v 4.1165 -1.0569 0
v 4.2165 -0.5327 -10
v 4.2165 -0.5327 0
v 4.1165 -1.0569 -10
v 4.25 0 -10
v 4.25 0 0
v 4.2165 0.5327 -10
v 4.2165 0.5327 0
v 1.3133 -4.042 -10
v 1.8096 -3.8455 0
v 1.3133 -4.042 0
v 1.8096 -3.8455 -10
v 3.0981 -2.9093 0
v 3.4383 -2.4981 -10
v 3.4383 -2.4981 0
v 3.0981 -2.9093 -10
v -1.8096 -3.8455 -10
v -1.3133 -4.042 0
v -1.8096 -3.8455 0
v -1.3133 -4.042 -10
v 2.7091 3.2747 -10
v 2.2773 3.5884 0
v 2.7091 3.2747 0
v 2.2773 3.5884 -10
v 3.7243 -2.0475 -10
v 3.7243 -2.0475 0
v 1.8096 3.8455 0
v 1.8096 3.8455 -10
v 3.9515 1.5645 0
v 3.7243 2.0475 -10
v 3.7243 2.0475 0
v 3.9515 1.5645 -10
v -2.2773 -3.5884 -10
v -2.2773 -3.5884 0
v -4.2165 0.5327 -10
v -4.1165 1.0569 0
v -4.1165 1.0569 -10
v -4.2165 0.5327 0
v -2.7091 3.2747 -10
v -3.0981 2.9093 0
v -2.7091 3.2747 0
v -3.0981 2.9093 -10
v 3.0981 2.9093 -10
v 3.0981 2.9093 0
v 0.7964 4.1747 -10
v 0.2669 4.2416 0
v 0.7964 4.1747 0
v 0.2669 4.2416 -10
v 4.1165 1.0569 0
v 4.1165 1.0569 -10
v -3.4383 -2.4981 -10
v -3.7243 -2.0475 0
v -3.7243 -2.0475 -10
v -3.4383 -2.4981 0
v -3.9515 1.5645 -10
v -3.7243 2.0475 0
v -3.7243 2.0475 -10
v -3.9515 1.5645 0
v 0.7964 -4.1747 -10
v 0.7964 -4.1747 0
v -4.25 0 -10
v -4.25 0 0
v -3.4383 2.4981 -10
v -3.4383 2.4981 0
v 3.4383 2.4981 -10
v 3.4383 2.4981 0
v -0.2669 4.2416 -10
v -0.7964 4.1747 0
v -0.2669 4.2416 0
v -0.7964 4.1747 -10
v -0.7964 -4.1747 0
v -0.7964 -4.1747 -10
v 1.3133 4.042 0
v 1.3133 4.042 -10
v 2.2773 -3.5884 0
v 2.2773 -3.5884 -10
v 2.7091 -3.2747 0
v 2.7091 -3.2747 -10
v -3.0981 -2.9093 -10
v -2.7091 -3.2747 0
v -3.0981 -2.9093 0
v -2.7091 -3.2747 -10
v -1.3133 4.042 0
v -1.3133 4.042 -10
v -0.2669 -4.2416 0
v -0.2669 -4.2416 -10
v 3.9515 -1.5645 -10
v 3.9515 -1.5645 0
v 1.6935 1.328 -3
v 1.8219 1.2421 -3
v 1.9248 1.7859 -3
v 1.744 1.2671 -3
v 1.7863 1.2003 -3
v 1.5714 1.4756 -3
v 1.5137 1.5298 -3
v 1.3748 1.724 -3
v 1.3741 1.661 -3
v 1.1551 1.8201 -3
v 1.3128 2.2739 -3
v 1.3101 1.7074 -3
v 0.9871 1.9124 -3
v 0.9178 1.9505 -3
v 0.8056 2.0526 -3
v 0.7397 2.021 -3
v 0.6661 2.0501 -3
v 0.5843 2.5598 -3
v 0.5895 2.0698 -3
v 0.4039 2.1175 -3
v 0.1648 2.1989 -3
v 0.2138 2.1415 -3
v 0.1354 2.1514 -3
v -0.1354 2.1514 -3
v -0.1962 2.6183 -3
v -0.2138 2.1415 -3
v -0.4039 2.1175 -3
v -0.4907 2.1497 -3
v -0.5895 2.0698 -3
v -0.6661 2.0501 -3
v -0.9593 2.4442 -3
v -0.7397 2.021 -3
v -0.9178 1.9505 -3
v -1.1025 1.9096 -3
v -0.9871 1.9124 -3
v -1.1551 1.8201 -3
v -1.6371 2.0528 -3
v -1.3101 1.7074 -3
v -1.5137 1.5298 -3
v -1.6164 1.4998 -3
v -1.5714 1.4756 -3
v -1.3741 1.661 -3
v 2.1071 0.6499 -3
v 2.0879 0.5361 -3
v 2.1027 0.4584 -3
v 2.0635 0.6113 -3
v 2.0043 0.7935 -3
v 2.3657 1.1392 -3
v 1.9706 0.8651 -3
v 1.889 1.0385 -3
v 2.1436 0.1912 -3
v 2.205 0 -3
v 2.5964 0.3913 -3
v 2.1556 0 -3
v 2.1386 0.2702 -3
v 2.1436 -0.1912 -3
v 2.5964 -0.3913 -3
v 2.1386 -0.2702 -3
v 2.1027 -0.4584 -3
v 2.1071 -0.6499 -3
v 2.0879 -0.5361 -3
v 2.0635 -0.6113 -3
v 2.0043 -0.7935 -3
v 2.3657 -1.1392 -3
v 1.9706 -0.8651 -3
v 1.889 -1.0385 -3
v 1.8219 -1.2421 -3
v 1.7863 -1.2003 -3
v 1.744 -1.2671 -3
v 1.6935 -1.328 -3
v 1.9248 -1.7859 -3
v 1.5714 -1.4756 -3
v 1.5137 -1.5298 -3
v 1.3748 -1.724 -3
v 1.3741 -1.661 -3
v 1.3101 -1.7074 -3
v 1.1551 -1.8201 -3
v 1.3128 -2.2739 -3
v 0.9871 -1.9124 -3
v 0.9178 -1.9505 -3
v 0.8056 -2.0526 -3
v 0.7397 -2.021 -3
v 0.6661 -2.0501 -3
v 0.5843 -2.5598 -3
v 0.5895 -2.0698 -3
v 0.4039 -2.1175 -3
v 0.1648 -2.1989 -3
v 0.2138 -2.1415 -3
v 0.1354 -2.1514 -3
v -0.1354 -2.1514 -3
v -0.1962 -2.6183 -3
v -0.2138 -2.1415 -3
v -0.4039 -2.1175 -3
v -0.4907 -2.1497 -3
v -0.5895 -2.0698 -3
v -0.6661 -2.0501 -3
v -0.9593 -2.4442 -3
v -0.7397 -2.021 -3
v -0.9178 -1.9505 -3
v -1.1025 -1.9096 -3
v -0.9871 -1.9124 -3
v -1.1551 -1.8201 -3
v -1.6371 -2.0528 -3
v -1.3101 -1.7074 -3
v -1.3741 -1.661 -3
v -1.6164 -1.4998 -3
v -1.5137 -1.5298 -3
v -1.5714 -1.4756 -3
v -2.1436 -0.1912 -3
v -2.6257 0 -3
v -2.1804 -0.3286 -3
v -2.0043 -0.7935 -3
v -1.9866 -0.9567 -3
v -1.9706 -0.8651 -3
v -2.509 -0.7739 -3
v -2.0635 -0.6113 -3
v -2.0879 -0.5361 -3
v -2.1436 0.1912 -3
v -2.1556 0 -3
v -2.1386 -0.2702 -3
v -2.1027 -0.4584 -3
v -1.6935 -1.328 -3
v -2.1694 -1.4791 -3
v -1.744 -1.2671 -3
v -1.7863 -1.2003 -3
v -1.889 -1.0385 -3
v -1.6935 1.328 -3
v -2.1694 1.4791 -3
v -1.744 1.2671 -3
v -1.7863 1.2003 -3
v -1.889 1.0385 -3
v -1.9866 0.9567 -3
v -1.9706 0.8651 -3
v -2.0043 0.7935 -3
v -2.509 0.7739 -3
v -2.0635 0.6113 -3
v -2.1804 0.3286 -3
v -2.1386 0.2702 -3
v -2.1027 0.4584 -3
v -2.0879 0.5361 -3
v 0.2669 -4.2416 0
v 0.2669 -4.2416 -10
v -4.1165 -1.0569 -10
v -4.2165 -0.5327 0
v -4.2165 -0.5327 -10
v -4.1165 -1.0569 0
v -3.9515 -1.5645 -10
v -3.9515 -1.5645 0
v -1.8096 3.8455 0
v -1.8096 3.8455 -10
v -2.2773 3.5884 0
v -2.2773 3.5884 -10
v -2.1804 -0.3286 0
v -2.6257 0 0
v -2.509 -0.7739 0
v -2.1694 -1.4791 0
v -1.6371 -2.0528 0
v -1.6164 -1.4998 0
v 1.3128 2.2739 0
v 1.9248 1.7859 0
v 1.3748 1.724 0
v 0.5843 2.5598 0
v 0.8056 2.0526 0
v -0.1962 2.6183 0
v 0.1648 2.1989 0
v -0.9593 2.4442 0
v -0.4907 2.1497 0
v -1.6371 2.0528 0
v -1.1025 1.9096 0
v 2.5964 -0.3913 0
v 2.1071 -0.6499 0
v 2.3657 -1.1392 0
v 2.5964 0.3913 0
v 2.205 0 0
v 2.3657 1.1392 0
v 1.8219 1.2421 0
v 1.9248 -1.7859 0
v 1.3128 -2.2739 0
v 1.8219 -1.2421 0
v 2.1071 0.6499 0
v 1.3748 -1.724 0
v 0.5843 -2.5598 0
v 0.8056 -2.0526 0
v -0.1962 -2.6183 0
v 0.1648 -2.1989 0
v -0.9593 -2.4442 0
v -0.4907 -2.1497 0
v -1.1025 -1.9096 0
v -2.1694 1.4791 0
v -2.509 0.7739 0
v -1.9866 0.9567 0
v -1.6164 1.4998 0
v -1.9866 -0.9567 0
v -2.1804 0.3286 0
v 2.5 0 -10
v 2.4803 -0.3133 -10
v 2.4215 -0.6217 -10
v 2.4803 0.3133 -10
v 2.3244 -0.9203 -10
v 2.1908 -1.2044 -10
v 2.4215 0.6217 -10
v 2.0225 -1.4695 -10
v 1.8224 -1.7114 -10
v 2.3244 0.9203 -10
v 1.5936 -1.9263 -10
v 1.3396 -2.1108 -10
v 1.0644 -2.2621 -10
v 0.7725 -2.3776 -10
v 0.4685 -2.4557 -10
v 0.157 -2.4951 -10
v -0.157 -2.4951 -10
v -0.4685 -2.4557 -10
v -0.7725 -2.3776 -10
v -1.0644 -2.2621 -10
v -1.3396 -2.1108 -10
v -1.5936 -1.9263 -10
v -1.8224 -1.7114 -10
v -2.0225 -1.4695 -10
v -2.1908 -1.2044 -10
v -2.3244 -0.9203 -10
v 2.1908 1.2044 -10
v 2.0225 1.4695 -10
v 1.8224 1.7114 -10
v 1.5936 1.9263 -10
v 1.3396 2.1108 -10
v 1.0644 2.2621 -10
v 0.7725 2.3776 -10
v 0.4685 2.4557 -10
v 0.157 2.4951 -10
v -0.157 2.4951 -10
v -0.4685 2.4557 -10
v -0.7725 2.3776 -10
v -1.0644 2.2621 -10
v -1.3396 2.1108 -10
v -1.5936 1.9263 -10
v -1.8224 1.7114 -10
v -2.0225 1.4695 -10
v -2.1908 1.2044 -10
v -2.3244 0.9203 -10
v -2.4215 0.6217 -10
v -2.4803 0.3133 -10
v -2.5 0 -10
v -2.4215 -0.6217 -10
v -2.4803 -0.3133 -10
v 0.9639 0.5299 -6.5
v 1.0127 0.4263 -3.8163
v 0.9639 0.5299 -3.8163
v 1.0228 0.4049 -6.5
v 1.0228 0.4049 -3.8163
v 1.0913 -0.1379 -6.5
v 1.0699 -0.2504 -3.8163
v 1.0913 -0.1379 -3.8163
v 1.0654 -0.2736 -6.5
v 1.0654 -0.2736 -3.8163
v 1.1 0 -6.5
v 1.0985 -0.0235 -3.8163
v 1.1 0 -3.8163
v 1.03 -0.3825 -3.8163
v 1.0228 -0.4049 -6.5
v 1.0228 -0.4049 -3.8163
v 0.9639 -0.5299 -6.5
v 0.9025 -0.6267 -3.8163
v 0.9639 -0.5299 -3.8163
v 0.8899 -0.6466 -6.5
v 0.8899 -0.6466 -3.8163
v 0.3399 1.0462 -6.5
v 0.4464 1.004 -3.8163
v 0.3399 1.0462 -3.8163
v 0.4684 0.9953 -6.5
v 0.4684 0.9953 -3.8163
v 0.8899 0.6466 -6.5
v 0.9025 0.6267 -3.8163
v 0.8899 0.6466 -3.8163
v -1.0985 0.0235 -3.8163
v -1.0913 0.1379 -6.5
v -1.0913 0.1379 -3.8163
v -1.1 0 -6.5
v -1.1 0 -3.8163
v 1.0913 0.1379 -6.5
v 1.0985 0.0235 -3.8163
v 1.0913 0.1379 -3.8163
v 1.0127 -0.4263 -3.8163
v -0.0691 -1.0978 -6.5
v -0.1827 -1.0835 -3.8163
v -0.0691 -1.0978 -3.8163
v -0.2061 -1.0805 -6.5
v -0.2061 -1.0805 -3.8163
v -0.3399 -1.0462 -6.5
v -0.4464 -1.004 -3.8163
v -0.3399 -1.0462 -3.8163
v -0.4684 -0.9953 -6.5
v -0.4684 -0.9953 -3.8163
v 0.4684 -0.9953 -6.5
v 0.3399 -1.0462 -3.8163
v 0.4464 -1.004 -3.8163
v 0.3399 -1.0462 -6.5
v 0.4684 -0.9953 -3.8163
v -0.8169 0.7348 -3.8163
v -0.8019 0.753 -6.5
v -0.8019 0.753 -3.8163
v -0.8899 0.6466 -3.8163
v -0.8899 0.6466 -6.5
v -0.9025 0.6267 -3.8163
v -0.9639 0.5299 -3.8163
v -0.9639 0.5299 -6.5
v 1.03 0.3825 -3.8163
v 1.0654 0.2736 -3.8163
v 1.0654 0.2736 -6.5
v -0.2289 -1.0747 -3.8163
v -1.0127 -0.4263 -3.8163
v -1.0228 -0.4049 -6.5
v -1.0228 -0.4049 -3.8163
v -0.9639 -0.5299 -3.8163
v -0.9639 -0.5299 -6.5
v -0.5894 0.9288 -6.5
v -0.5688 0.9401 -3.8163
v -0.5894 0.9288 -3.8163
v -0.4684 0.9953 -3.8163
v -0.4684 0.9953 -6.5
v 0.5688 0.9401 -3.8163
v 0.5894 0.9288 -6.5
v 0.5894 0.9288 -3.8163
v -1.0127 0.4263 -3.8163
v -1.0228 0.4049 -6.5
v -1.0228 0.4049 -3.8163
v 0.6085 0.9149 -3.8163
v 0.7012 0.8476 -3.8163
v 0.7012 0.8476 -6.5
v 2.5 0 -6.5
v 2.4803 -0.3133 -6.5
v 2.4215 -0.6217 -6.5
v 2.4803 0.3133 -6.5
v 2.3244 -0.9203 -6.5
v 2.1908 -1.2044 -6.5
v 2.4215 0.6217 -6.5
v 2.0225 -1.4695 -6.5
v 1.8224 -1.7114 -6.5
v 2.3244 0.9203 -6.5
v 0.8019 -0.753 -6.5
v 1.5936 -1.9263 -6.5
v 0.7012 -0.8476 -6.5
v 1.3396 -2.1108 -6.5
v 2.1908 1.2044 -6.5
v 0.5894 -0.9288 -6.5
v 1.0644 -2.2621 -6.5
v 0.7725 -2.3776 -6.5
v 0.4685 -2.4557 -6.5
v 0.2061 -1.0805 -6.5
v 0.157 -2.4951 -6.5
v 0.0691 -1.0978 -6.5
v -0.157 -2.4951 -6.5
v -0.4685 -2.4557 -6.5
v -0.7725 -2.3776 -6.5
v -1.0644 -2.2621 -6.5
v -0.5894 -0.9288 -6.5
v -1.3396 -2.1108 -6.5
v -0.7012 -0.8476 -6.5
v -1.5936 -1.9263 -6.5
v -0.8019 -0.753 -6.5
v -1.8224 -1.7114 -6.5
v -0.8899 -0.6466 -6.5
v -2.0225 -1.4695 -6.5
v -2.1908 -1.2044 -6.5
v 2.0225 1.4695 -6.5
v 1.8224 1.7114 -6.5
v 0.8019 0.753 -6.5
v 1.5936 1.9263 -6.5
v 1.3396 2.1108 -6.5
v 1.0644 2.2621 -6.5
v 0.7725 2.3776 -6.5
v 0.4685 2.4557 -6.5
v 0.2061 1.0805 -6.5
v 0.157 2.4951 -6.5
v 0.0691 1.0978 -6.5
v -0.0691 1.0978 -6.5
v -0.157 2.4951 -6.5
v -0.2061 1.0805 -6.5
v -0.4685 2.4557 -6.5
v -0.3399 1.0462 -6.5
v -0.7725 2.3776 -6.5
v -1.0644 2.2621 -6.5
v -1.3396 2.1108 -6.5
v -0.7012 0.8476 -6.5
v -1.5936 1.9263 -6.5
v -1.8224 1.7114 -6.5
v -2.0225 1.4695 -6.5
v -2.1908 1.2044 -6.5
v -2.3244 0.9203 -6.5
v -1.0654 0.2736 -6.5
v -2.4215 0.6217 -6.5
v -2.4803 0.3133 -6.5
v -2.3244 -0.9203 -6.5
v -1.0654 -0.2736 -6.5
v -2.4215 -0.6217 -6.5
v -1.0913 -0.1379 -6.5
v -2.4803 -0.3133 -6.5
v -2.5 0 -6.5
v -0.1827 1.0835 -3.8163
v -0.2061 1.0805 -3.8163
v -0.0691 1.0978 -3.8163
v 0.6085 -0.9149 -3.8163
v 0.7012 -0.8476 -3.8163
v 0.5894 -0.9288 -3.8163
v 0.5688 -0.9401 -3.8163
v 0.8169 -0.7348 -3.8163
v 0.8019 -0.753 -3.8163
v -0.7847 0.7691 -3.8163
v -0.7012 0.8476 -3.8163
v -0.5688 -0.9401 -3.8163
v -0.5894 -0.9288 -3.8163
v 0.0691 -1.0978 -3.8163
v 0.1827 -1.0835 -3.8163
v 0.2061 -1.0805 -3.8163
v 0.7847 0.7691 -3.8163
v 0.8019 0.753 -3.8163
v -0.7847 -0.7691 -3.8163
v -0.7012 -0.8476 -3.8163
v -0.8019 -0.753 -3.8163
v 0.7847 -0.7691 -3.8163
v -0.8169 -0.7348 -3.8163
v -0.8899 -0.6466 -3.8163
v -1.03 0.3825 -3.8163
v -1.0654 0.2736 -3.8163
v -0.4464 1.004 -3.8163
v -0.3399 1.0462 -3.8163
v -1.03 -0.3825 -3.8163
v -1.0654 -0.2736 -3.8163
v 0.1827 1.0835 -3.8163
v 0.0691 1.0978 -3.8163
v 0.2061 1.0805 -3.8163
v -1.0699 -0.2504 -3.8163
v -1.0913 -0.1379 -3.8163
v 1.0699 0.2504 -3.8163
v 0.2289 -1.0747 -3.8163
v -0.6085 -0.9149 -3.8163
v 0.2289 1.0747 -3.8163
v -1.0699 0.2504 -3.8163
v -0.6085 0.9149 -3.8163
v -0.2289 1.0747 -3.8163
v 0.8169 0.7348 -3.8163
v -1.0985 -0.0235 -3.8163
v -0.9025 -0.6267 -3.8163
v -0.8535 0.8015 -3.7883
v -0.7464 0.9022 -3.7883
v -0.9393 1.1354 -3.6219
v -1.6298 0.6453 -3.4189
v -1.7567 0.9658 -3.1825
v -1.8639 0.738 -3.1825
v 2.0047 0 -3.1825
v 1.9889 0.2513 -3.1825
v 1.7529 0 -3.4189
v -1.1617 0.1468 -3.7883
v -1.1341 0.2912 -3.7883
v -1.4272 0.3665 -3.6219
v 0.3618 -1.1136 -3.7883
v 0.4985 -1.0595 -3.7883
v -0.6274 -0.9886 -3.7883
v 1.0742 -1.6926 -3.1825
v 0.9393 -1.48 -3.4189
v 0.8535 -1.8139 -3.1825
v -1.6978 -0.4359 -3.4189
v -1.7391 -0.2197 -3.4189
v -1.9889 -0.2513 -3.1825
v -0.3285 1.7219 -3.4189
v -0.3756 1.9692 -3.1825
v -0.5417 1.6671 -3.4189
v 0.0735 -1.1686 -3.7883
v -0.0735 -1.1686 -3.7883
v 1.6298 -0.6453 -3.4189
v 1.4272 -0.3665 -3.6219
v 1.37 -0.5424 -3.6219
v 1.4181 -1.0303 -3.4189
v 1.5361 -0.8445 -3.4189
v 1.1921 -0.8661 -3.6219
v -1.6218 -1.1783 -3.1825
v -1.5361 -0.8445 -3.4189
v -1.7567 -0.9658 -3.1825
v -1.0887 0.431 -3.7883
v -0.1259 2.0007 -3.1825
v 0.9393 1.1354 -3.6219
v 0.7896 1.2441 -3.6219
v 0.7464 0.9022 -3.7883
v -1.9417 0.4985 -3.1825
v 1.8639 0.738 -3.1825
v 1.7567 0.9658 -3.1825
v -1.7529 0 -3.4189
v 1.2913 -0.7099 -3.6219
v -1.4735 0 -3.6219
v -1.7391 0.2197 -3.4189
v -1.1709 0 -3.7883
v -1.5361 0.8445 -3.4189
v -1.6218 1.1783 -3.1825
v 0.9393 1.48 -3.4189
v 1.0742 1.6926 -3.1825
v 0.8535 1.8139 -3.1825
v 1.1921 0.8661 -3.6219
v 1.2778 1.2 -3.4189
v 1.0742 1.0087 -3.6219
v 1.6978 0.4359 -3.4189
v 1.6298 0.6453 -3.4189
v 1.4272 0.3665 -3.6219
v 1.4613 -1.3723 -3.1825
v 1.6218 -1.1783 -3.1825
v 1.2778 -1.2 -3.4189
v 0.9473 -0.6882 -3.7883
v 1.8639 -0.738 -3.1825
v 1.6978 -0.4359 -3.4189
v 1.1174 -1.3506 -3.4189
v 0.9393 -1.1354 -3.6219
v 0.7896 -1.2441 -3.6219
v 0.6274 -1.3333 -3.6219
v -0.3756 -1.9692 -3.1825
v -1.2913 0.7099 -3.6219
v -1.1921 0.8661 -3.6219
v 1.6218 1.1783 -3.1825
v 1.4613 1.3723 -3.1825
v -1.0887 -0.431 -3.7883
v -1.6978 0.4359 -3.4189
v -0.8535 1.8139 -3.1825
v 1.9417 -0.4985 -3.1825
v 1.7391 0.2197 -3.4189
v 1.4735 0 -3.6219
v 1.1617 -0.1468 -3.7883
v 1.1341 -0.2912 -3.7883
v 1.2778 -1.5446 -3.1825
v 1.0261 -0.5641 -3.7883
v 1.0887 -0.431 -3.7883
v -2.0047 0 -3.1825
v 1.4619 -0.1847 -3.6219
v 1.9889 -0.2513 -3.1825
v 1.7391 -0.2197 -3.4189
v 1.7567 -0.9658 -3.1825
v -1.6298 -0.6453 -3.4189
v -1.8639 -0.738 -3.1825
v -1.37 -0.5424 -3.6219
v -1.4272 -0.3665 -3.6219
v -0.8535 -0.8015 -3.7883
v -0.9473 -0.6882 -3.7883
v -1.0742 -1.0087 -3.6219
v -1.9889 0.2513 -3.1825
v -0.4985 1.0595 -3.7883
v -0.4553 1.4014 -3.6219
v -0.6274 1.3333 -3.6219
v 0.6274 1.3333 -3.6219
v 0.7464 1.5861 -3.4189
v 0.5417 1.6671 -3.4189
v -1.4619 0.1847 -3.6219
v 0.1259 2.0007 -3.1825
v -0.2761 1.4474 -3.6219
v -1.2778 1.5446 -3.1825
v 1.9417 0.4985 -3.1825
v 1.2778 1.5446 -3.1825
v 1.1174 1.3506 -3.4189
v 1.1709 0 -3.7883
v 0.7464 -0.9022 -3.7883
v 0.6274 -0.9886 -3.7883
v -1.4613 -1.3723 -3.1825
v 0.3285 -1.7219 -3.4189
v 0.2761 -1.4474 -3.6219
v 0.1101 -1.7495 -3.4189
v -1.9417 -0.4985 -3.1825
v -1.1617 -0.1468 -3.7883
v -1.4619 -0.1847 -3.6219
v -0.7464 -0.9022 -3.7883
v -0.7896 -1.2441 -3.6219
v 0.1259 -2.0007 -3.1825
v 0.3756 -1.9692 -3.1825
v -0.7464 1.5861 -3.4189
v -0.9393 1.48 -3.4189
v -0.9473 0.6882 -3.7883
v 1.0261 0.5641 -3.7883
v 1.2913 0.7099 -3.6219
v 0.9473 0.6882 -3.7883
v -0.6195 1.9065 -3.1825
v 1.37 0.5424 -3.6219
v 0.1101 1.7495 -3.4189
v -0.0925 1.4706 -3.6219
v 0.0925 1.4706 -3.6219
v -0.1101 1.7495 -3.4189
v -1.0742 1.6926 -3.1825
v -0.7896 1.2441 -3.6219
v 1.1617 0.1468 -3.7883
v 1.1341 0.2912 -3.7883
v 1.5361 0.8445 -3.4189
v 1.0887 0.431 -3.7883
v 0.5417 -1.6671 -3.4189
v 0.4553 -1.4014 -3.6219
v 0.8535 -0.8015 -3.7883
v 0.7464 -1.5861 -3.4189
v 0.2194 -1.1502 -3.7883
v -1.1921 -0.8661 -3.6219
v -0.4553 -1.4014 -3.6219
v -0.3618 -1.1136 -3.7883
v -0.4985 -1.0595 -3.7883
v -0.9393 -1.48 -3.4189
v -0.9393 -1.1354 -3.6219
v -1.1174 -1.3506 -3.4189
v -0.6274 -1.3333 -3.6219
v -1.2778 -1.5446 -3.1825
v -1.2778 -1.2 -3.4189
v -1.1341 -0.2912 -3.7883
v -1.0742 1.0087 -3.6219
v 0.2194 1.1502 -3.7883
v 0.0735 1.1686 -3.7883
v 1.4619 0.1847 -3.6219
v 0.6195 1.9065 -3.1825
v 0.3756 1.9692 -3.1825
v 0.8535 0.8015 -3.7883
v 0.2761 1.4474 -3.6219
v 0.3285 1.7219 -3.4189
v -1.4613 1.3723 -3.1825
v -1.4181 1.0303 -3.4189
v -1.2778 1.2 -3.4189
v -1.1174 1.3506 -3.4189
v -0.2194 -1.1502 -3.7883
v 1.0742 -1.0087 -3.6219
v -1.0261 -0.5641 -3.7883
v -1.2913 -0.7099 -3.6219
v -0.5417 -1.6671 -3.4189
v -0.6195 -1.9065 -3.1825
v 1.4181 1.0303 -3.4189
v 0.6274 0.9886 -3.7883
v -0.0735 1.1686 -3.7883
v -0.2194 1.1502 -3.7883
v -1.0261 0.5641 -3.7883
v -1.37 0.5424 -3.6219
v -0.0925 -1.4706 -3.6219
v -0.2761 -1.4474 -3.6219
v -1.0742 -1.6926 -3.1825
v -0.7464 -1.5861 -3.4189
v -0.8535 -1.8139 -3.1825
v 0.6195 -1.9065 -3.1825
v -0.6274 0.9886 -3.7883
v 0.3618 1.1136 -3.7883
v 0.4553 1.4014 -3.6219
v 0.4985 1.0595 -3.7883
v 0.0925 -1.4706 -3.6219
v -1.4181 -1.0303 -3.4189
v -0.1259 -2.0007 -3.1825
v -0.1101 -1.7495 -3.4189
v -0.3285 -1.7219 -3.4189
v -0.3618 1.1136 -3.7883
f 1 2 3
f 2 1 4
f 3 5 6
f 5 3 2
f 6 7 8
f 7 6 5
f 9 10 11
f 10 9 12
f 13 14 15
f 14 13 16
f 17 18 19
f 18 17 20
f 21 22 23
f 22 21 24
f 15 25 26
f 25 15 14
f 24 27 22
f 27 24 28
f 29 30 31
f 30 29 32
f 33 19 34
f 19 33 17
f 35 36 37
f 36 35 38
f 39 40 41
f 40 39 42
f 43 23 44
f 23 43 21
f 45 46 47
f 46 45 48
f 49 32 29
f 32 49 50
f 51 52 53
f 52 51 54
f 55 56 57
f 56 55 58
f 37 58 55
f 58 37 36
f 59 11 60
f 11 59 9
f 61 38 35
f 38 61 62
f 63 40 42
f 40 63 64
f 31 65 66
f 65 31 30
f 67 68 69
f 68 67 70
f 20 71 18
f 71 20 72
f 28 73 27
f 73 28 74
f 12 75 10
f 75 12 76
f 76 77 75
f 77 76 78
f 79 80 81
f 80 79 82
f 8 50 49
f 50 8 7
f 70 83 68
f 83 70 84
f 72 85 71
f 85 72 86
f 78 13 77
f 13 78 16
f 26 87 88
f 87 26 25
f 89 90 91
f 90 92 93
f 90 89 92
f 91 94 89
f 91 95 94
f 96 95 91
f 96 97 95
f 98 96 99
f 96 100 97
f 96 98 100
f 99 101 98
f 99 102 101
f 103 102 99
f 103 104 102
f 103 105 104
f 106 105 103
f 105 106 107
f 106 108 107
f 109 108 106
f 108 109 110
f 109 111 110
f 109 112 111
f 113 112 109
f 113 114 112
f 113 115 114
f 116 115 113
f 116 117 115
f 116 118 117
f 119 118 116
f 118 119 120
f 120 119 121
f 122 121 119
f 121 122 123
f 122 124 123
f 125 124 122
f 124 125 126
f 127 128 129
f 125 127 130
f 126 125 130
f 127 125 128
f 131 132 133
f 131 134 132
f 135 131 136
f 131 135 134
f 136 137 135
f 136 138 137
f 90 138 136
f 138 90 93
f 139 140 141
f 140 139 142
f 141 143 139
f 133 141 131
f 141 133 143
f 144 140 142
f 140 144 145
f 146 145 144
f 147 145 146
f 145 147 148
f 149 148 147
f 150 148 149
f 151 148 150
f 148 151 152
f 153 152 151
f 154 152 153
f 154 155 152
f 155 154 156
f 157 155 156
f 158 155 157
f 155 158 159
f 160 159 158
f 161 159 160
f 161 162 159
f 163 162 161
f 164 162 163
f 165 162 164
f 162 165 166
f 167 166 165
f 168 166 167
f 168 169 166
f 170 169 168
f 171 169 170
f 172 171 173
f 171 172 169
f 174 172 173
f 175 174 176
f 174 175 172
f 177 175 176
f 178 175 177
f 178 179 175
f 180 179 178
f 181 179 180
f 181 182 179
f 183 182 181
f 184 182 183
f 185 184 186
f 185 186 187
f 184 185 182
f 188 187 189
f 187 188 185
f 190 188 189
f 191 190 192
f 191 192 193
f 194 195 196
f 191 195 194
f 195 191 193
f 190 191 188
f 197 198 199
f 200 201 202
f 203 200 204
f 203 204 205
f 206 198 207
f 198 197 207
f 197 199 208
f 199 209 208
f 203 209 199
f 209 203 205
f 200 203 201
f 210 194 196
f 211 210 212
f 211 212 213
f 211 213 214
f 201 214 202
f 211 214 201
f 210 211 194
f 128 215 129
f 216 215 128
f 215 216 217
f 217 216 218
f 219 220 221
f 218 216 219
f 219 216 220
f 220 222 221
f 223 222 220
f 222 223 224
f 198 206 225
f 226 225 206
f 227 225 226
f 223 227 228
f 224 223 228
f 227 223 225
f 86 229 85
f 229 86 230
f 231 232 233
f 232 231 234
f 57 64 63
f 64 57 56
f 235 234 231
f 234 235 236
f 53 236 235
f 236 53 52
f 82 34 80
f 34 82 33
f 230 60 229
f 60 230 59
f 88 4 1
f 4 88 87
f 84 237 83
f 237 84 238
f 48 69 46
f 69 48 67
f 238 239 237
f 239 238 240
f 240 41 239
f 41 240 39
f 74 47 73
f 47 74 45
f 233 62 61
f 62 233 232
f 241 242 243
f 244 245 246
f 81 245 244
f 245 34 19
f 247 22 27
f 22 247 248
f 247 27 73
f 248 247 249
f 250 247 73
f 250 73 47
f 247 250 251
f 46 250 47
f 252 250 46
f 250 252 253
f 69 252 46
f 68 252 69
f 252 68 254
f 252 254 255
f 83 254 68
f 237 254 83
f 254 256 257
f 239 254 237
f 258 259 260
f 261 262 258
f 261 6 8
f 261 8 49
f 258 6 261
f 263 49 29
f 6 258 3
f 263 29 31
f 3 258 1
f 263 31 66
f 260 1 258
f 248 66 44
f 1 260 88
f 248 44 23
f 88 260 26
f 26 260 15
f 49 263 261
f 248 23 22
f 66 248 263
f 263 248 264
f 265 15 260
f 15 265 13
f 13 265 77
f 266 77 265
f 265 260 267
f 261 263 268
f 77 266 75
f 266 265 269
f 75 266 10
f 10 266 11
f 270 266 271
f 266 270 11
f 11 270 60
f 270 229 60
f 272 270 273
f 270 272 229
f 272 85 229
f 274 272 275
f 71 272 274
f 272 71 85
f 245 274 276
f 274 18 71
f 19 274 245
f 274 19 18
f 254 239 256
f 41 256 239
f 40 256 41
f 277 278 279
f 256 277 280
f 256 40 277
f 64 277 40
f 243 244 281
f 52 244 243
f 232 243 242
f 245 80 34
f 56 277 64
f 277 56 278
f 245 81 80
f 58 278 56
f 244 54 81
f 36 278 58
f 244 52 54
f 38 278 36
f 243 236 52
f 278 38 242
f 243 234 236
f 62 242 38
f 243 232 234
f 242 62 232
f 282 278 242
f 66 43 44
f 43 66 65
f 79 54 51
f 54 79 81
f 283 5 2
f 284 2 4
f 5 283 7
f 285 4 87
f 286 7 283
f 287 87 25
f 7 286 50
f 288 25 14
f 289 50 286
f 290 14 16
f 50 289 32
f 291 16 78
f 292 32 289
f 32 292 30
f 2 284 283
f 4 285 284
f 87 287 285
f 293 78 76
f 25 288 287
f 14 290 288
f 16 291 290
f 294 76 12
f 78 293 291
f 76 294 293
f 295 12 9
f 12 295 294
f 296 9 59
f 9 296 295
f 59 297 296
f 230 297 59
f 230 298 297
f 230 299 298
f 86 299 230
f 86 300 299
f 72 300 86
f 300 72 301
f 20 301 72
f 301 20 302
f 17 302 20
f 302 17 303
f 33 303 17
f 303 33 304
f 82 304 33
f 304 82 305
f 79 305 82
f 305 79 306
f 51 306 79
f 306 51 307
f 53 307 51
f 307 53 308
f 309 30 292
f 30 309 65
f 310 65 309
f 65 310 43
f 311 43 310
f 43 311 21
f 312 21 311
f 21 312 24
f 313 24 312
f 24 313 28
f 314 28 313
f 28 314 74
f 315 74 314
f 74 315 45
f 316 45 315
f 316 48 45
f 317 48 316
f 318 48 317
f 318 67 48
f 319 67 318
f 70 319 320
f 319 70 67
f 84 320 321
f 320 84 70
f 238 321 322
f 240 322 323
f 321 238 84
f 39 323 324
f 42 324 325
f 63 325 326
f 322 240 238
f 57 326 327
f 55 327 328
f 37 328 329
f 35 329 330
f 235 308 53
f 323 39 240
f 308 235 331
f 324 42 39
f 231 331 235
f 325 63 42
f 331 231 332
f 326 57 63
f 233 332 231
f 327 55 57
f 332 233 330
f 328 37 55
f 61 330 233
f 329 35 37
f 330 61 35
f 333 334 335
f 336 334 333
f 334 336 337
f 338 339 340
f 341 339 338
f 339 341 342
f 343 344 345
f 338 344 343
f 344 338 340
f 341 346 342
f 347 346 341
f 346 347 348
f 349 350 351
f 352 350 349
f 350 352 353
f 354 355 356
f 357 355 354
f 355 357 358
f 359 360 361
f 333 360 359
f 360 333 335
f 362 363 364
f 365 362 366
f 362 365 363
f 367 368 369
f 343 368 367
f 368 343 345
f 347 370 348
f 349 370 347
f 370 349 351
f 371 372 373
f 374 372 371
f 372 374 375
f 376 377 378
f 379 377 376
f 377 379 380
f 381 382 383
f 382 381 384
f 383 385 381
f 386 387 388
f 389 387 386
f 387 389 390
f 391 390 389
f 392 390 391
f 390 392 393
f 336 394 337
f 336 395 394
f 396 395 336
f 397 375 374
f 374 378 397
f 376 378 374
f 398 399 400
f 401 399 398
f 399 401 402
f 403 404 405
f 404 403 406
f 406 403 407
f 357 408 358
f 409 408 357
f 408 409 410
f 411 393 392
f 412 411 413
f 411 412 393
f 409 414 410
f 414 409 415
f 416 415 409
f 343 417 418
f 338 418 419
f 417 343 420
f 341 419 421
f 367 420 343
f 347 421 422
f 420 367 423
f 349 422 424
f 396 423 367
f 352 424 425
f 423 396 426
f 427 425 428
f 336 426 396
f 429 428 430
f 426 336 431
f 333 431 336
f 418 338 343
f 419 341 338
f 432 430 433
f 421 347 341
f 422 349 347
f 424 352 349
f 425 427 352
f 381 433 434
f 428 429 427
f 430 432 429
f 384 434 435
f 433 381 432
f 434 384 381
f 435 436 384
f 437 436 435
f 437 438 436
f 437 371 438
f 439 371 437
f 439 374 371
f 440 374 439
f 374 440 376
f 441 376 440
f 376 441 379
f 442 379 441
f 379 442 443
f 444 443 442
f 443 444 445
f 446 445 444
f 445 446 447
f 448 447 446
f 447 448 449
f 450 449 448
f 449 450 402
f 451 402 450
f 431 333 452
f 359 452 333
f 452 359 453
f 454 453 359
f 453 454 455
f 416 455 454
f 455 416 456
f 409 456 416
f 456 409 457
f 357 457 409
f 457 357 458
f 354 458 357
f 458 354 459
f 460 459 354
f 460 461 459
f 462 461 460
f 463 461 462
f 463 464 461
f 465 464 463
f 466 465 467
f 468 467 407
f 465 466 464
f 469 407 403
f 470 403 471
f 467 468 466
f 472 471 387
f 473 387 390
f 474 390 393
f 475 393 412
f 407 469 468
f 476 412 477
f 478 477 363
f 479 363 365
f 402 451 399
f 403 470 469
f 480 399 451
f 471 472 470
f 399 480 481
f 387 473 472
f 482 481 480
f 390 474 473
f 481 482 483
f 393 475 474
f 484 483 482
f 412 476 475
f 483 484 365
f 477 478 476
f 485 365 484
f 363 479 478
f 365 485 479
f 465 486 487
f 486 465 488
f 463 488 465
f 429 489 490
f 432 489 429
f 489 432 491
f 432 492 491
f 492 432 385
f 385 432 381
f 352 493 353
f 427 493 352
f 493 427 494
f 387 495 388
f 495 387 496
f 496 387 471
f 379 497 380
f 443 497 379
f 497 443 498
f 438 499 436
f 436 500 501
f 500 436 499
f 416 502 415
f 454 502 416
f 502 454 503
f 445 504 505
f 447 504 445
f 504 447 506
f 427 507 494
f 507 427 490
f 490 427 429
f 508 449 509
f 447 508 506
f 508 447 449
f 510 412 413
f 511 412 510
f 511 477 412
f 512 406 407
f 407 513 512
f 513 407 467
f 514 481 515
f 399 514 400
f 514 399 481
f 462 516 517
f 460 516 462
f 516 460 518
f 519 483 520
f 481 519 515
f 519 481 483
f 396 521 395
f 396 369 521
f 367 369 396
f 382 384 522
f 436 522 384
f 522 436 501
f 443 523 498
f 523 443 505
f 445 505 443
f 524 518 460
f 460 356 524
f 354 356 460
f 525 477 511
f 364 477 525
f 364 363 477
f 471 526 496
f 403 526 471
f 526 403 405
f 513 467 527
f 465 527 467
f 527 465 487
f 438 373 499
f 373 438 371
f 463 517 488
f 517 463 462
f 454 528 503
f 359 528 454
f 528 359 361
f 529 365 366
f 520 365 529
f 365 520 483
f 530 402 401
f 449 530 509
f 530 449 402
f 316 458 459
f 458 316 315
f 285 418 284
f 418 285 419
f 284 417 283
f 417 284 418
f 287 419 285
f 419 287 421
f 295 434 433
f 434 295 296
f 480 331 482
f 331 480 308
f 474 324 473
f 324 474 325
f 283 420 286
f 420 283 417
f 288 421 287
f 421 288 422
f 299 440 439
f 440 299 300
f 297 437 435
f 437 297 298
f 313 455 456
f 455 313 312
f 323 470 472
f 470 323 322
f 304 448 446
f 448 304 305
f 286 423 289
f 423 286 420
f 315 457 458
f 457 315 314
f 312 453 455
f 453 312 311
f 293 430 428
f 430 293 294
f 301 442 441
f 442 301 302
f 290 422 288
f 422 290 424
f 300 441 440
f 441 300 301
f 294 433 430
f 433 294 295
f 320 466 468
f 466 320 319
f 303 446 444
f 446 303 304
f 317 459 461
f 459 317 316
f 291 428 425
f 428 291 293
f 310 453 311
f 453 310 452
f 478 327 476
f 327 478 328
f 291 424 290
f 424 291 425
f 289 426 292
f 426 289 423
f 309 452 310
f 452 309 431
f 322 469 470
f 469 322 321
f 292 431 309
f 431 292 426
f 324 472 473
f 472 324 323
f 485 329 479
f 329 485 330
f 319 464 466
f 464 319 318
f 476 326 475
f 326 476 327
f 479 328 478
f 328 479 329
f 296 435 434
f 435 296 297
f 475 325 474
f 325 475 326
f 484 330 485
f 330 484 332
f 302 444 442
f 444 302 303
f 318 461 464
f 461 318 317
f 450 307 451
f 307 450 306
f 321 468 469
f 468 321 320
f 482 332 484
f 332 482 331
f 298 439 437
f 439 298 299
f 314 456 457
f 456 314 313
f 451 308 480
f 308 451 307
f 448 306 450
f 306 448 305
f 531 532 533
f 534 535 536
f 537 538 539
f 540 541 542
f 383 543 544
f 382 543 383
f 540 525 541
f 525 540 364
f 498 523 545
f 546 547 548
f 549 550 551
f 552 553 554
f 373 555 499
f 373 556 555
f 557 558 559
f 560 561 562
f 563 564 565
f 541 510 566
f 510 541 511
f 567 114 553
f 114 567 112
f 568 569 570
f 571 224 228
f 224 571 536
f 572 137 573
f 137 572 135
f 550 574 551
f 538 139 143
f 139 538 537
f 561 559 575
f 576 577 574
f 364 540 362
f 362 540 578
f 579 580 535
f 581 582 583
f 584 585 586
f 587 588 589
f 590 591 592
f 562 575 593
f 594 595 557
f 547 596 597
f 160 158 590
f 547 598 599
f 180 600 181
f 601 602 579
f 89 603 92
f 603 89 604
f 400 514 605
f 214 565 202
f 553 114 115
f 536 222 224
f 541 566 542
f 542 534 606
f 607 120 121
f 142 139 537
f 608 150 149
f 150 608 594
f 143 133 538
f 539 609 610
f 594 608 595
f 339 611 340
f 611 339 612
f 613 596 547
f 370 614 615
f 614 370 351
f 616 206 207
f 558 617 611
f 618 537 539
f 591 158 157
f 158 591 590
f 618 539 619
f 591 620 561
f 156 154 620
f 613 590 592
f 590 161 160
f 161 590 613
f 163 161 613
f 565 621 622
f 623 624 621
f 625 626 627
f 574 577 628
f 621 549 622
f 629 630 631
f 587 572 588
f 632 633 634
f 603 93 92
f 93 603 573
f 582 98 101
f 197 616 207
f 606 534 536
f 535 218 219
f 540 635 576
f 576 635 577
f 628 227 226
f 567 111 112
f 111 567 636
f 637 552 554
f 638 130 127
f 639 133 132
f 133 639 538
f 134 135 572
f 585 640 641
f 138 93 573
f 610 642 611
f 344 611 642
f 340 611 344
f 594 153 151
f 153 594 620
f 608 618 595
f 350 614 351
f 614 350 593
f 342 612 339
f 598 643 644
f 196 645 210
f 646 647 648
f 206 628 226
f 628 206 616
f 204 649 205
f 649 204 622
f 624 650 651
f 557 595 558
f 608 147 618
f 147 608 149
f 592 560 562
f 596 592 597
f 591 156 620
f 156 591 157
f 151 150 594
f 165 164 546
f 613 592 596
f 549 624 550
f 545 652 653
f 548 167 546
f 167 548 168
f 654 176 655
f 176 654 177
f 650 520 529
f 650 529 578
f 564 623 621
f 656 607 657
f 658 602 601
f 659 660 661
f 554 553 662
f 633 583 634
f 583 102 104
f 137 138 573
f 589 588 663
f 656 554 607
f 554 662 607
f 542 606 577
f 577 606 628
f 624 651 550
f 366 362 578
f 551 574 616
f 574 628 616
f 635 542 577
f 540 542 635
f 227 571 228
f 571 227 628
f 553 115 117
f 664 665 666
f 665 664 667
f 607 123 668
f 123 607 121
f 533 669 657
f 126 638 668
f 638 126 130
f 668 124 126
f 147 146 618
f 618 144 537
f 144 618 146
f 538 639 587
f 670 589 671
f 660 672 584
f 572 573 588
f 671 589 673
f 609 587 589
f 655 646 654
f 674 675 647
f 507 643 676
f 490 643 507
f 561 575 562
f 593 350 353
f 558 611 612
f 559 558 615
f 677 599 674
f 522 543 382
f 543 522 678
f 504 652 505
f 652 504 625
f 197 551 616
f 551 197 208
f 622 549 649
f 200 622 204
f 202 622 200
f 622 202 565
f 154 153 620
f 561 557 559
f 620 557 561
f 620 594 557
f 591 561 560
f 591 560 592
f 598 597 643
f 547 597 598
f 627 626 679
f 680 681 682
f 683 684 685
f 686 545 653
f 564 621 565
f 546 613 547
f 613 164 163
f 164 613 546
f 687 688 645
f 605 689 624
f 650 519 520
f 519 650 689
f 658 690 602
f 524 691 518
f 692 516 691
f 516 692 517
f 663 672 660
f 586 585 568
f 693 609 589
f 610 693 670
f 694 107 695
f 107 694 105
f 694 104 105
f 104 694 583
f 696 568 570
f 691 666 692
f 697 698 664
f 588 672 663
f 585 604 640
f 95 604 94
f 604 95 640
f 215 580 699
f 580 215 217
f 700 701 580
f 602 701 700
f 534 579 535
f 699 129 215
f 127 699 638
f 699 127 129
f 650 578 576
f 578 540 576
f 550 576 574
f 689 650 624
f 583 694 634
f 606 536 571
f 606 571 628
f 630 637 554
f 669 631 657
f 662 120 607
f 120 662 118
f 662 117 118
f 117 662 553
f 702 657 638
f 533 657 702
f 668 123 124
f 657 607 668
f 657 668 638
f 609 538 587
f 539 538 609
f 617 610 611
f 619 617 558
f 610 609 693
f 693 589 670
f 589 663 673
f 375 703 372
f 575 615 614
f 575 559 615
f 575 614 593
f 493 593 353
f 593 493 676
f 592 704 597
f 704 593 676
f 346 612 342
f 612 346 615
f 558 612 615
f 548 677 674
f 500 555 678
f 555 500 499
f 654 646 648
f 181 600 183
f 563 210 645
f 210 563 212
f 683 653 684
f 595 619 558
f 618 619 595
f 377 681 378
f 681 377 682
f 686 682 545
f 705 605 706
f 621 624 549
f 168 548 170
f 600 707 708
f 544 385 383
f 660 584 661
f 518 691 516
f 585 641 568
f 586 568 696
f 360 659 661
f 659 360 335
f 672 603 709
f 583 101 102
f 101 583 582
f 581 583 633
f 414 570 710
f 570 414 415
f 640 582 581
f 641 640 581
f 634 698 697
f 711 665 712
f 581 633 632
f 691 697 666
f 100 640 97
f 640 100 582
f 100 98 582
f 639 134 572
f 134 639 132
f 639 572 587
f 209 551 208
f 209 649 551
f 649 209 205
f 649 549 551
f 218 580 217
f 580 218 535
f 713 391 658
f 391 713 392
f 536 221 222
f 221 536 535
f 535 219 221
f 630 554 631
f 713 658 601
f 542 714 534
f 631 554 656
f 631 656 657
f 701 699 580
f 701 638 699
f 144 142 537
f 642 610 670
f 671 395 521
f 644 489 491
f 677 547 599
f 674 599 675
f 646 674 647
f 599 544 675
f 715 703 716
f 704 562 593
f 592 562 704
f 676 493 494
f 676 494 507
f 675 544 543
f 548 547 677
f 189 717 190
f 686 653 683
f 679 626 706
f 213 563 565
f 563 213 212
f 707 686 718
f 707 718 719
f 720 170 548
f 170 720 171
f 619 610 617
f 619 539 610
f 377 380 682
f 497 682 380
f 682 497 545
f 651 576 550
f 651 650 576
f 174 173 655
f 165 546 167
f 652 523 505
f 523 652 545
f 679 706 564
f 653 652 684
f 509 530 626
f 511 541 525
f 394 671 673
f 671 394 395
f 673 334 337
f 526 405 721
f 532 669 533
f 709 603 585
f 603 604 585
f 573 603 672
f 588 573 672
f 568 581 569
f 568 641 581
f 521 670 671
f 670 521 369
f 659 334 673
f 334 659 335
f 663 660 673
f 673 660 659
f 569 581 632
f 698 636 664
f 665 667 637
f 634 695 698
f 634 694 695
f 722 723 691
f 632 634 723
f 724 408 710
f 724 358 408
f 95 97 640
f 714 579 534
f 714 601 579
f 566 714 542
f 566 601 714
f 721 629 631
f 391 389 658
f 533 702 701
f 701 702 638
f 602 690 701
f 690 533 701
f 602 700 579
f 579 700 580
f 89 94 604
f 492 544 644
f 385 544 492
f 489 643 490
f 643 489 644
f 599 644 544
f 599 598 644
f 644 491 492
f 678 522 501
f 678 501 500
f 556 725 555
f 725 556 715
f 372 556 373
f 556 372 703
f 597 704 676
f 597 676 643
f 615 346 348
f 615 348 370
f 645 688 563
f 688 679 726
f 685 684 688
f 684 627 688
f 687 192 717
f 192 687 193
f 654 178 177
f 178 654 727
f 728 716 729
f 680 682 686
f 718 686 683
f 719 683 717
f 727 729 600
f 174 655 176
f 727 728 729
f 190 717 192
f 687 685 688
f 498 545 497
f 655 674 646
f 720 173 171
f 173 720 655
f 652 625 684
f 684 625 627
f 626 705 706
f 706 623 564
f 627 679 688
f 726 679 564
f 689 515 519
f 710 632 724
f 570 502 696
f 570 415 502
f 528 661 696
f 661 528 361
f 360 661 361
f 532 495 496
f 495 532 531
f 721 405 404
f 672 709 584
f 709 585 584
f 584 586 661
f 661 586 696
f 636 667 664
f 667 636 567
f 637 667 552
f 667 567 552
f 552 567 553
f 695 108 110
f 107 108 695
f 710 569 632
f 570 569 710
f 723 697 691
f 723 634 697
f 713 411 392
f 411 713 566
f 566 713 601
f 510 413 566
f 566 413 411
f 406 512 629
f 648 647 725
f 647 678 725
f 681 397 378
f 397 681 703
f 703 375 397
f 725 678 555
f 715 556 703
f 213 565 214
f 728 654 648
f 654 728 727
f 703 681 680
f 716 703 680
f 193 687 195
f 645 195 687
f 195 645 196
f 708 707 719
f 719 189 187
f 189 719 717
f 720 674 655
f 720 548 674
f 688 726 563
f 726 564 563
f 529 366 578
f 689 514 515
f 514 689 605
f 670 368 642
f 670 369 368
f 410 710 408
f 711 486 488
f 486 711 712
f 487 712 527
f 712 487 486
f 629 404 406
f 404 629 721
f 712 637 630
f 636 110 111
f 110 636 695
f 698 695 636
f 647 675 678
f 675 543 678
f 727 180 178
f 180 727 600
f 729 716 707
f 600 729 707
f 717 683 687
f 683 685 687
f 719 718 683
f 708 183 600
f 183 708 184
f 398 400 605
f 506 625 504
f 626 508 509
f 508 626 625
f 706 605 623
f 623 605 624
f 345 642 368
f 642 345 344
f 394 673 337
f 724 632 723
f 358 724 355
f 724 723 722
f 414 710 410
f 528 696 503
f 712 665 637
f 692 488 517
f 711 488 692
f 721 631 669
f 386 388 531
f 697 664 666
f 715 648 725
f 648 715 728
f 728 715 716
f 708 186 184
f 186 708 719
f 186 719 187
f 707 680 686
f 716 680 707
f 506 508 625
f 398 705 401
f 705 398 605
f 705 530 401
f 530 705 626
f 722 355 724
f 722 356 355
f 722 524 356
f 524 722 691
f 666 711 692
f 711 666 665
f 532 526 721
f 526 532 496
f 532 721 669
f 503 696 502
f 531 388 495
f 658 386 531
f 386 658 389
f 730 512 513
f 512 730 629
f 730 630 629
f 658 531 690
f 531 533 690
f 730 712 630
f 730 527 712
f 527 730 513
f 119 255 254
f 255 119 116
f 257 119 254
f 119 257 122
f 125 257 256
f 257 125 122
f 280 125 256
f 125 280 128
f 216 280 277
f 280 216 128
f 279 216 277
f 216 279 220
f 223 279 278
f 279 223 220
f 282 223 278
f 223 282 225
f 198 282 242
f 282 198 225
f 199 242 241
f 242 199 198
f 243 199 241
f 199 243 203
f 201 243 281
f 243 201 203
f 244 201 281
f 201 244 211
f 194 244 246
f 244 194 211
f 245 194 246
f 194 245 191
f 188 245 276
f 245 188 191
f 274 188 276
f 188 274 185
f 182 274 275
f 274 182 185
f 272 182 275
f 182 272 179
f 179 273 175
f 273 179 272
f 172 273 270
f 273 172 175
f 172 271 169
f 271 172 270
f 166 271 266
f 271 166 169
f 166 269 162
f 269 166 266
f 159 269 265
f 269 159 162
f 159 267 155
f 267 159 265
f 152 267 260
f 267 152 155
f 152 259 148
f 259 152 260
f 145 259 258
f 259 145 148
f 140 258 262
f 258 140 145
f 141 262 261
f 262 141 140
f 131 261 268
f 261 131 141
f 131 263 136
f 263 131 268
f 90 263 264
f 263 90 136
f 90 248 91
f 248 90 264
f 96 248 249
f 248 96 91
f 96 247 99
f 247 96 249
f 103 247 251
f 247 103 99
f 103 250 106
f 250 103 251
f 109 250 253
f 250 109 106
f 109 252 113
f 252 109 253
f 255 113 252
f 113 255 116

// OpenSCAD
/*
Copyright (c) 2017 Paul Austin - SDG

Permission is hereby granted, free of charge, to any person obtaining a copy
of this software and associated documentation files (the "Software"), to deal
in the Software without restriction, including without limitation the rights
to use, copy, modify, merge, publish, distribute, sublicense, and/or sell
copies of the Software, and to permit persons to whom the Software is
furnished to do so, subject to the following conditions:

The above copyright notice and this permission notice shall be included in all
copies or substantial portions of the Software.

THE SOFTWARE IS PROVIDED "AS IS", WITHOUT WARRANTY OF ANY KIND, EXPRESS OR
IMPLIED, INCLUDING BUT NOT LIMITED TO THE WARRANTIES OF MERCHANTABILITY,
FITNESS FOR A PARTICULAR PURPOSE AND NONINFRINGEMENT. IN NO EVENT SHALL THE
AUTHORS OR COPYRIGHT HOLDERS BE LIABLE FOR ANY CLAIM, DAMAGES OR OTHER
LIABILITY, WHETHER IN AN ACTION OF CONTRACT, TORT OR OTHERWISE, ARISING FROM,
OUT OF OR IN CONNECTION WITH THE SOFTWARE OR THE USE OR OTHER DEALINGS IN THE
SOFTWARE.
*/

$fn = 50;

module coreHub(splineCount = 20, coreH = 4.5, splineH = 3, splineD=5.0, d = 8.5) {
    
    // Approx spline shaft diameters
    // sg90(subMicro) - 5mm
    // micro          - 6mm
    screwFlangeThickness = 3.5;
    screwHeadDiameter = 5;
    screwShaftDiameter = 2.2;
    
    // The main shaft hub
    difference() {
        cylinder(d=d, h=splineH);
        cylinder(d=splineD+0.35, h=splineH);
    }

    // Splines on the inside of the hub
    #color("red") linear_extrude(splineH)
    for ( rib = [0:(360/splineCount):360]) {
        // Pivot aroung origin
        rotate([0,0,rib])
        // Move out from origin
        translate([splineD/2+0.2,0,0])
        // Make corner face origin
        rotate([0,0,45])
        // Make a square
        square([0.7,0.7], center = true);
    }
    

    // Hole for the screw
    color("green") difference() {    
        translate([0,0,splineH]) cylinder(d=d,h=(coreH - splineH));
        {
        #translate([0,0,splineH]) cylinder(d=screwShaftDiameter, h=screwFlangeThickness);
        #translate([0,0,splineH+screwFlangeThickness]) cylinder(d=screwHeadDiameter,h=10);
        #translate([0,0,1.3])sphere(d=5.5);
        }
    }
    
}

rotate([180,0,0]) coreHub(splineCount = 21, coreH = 10);
